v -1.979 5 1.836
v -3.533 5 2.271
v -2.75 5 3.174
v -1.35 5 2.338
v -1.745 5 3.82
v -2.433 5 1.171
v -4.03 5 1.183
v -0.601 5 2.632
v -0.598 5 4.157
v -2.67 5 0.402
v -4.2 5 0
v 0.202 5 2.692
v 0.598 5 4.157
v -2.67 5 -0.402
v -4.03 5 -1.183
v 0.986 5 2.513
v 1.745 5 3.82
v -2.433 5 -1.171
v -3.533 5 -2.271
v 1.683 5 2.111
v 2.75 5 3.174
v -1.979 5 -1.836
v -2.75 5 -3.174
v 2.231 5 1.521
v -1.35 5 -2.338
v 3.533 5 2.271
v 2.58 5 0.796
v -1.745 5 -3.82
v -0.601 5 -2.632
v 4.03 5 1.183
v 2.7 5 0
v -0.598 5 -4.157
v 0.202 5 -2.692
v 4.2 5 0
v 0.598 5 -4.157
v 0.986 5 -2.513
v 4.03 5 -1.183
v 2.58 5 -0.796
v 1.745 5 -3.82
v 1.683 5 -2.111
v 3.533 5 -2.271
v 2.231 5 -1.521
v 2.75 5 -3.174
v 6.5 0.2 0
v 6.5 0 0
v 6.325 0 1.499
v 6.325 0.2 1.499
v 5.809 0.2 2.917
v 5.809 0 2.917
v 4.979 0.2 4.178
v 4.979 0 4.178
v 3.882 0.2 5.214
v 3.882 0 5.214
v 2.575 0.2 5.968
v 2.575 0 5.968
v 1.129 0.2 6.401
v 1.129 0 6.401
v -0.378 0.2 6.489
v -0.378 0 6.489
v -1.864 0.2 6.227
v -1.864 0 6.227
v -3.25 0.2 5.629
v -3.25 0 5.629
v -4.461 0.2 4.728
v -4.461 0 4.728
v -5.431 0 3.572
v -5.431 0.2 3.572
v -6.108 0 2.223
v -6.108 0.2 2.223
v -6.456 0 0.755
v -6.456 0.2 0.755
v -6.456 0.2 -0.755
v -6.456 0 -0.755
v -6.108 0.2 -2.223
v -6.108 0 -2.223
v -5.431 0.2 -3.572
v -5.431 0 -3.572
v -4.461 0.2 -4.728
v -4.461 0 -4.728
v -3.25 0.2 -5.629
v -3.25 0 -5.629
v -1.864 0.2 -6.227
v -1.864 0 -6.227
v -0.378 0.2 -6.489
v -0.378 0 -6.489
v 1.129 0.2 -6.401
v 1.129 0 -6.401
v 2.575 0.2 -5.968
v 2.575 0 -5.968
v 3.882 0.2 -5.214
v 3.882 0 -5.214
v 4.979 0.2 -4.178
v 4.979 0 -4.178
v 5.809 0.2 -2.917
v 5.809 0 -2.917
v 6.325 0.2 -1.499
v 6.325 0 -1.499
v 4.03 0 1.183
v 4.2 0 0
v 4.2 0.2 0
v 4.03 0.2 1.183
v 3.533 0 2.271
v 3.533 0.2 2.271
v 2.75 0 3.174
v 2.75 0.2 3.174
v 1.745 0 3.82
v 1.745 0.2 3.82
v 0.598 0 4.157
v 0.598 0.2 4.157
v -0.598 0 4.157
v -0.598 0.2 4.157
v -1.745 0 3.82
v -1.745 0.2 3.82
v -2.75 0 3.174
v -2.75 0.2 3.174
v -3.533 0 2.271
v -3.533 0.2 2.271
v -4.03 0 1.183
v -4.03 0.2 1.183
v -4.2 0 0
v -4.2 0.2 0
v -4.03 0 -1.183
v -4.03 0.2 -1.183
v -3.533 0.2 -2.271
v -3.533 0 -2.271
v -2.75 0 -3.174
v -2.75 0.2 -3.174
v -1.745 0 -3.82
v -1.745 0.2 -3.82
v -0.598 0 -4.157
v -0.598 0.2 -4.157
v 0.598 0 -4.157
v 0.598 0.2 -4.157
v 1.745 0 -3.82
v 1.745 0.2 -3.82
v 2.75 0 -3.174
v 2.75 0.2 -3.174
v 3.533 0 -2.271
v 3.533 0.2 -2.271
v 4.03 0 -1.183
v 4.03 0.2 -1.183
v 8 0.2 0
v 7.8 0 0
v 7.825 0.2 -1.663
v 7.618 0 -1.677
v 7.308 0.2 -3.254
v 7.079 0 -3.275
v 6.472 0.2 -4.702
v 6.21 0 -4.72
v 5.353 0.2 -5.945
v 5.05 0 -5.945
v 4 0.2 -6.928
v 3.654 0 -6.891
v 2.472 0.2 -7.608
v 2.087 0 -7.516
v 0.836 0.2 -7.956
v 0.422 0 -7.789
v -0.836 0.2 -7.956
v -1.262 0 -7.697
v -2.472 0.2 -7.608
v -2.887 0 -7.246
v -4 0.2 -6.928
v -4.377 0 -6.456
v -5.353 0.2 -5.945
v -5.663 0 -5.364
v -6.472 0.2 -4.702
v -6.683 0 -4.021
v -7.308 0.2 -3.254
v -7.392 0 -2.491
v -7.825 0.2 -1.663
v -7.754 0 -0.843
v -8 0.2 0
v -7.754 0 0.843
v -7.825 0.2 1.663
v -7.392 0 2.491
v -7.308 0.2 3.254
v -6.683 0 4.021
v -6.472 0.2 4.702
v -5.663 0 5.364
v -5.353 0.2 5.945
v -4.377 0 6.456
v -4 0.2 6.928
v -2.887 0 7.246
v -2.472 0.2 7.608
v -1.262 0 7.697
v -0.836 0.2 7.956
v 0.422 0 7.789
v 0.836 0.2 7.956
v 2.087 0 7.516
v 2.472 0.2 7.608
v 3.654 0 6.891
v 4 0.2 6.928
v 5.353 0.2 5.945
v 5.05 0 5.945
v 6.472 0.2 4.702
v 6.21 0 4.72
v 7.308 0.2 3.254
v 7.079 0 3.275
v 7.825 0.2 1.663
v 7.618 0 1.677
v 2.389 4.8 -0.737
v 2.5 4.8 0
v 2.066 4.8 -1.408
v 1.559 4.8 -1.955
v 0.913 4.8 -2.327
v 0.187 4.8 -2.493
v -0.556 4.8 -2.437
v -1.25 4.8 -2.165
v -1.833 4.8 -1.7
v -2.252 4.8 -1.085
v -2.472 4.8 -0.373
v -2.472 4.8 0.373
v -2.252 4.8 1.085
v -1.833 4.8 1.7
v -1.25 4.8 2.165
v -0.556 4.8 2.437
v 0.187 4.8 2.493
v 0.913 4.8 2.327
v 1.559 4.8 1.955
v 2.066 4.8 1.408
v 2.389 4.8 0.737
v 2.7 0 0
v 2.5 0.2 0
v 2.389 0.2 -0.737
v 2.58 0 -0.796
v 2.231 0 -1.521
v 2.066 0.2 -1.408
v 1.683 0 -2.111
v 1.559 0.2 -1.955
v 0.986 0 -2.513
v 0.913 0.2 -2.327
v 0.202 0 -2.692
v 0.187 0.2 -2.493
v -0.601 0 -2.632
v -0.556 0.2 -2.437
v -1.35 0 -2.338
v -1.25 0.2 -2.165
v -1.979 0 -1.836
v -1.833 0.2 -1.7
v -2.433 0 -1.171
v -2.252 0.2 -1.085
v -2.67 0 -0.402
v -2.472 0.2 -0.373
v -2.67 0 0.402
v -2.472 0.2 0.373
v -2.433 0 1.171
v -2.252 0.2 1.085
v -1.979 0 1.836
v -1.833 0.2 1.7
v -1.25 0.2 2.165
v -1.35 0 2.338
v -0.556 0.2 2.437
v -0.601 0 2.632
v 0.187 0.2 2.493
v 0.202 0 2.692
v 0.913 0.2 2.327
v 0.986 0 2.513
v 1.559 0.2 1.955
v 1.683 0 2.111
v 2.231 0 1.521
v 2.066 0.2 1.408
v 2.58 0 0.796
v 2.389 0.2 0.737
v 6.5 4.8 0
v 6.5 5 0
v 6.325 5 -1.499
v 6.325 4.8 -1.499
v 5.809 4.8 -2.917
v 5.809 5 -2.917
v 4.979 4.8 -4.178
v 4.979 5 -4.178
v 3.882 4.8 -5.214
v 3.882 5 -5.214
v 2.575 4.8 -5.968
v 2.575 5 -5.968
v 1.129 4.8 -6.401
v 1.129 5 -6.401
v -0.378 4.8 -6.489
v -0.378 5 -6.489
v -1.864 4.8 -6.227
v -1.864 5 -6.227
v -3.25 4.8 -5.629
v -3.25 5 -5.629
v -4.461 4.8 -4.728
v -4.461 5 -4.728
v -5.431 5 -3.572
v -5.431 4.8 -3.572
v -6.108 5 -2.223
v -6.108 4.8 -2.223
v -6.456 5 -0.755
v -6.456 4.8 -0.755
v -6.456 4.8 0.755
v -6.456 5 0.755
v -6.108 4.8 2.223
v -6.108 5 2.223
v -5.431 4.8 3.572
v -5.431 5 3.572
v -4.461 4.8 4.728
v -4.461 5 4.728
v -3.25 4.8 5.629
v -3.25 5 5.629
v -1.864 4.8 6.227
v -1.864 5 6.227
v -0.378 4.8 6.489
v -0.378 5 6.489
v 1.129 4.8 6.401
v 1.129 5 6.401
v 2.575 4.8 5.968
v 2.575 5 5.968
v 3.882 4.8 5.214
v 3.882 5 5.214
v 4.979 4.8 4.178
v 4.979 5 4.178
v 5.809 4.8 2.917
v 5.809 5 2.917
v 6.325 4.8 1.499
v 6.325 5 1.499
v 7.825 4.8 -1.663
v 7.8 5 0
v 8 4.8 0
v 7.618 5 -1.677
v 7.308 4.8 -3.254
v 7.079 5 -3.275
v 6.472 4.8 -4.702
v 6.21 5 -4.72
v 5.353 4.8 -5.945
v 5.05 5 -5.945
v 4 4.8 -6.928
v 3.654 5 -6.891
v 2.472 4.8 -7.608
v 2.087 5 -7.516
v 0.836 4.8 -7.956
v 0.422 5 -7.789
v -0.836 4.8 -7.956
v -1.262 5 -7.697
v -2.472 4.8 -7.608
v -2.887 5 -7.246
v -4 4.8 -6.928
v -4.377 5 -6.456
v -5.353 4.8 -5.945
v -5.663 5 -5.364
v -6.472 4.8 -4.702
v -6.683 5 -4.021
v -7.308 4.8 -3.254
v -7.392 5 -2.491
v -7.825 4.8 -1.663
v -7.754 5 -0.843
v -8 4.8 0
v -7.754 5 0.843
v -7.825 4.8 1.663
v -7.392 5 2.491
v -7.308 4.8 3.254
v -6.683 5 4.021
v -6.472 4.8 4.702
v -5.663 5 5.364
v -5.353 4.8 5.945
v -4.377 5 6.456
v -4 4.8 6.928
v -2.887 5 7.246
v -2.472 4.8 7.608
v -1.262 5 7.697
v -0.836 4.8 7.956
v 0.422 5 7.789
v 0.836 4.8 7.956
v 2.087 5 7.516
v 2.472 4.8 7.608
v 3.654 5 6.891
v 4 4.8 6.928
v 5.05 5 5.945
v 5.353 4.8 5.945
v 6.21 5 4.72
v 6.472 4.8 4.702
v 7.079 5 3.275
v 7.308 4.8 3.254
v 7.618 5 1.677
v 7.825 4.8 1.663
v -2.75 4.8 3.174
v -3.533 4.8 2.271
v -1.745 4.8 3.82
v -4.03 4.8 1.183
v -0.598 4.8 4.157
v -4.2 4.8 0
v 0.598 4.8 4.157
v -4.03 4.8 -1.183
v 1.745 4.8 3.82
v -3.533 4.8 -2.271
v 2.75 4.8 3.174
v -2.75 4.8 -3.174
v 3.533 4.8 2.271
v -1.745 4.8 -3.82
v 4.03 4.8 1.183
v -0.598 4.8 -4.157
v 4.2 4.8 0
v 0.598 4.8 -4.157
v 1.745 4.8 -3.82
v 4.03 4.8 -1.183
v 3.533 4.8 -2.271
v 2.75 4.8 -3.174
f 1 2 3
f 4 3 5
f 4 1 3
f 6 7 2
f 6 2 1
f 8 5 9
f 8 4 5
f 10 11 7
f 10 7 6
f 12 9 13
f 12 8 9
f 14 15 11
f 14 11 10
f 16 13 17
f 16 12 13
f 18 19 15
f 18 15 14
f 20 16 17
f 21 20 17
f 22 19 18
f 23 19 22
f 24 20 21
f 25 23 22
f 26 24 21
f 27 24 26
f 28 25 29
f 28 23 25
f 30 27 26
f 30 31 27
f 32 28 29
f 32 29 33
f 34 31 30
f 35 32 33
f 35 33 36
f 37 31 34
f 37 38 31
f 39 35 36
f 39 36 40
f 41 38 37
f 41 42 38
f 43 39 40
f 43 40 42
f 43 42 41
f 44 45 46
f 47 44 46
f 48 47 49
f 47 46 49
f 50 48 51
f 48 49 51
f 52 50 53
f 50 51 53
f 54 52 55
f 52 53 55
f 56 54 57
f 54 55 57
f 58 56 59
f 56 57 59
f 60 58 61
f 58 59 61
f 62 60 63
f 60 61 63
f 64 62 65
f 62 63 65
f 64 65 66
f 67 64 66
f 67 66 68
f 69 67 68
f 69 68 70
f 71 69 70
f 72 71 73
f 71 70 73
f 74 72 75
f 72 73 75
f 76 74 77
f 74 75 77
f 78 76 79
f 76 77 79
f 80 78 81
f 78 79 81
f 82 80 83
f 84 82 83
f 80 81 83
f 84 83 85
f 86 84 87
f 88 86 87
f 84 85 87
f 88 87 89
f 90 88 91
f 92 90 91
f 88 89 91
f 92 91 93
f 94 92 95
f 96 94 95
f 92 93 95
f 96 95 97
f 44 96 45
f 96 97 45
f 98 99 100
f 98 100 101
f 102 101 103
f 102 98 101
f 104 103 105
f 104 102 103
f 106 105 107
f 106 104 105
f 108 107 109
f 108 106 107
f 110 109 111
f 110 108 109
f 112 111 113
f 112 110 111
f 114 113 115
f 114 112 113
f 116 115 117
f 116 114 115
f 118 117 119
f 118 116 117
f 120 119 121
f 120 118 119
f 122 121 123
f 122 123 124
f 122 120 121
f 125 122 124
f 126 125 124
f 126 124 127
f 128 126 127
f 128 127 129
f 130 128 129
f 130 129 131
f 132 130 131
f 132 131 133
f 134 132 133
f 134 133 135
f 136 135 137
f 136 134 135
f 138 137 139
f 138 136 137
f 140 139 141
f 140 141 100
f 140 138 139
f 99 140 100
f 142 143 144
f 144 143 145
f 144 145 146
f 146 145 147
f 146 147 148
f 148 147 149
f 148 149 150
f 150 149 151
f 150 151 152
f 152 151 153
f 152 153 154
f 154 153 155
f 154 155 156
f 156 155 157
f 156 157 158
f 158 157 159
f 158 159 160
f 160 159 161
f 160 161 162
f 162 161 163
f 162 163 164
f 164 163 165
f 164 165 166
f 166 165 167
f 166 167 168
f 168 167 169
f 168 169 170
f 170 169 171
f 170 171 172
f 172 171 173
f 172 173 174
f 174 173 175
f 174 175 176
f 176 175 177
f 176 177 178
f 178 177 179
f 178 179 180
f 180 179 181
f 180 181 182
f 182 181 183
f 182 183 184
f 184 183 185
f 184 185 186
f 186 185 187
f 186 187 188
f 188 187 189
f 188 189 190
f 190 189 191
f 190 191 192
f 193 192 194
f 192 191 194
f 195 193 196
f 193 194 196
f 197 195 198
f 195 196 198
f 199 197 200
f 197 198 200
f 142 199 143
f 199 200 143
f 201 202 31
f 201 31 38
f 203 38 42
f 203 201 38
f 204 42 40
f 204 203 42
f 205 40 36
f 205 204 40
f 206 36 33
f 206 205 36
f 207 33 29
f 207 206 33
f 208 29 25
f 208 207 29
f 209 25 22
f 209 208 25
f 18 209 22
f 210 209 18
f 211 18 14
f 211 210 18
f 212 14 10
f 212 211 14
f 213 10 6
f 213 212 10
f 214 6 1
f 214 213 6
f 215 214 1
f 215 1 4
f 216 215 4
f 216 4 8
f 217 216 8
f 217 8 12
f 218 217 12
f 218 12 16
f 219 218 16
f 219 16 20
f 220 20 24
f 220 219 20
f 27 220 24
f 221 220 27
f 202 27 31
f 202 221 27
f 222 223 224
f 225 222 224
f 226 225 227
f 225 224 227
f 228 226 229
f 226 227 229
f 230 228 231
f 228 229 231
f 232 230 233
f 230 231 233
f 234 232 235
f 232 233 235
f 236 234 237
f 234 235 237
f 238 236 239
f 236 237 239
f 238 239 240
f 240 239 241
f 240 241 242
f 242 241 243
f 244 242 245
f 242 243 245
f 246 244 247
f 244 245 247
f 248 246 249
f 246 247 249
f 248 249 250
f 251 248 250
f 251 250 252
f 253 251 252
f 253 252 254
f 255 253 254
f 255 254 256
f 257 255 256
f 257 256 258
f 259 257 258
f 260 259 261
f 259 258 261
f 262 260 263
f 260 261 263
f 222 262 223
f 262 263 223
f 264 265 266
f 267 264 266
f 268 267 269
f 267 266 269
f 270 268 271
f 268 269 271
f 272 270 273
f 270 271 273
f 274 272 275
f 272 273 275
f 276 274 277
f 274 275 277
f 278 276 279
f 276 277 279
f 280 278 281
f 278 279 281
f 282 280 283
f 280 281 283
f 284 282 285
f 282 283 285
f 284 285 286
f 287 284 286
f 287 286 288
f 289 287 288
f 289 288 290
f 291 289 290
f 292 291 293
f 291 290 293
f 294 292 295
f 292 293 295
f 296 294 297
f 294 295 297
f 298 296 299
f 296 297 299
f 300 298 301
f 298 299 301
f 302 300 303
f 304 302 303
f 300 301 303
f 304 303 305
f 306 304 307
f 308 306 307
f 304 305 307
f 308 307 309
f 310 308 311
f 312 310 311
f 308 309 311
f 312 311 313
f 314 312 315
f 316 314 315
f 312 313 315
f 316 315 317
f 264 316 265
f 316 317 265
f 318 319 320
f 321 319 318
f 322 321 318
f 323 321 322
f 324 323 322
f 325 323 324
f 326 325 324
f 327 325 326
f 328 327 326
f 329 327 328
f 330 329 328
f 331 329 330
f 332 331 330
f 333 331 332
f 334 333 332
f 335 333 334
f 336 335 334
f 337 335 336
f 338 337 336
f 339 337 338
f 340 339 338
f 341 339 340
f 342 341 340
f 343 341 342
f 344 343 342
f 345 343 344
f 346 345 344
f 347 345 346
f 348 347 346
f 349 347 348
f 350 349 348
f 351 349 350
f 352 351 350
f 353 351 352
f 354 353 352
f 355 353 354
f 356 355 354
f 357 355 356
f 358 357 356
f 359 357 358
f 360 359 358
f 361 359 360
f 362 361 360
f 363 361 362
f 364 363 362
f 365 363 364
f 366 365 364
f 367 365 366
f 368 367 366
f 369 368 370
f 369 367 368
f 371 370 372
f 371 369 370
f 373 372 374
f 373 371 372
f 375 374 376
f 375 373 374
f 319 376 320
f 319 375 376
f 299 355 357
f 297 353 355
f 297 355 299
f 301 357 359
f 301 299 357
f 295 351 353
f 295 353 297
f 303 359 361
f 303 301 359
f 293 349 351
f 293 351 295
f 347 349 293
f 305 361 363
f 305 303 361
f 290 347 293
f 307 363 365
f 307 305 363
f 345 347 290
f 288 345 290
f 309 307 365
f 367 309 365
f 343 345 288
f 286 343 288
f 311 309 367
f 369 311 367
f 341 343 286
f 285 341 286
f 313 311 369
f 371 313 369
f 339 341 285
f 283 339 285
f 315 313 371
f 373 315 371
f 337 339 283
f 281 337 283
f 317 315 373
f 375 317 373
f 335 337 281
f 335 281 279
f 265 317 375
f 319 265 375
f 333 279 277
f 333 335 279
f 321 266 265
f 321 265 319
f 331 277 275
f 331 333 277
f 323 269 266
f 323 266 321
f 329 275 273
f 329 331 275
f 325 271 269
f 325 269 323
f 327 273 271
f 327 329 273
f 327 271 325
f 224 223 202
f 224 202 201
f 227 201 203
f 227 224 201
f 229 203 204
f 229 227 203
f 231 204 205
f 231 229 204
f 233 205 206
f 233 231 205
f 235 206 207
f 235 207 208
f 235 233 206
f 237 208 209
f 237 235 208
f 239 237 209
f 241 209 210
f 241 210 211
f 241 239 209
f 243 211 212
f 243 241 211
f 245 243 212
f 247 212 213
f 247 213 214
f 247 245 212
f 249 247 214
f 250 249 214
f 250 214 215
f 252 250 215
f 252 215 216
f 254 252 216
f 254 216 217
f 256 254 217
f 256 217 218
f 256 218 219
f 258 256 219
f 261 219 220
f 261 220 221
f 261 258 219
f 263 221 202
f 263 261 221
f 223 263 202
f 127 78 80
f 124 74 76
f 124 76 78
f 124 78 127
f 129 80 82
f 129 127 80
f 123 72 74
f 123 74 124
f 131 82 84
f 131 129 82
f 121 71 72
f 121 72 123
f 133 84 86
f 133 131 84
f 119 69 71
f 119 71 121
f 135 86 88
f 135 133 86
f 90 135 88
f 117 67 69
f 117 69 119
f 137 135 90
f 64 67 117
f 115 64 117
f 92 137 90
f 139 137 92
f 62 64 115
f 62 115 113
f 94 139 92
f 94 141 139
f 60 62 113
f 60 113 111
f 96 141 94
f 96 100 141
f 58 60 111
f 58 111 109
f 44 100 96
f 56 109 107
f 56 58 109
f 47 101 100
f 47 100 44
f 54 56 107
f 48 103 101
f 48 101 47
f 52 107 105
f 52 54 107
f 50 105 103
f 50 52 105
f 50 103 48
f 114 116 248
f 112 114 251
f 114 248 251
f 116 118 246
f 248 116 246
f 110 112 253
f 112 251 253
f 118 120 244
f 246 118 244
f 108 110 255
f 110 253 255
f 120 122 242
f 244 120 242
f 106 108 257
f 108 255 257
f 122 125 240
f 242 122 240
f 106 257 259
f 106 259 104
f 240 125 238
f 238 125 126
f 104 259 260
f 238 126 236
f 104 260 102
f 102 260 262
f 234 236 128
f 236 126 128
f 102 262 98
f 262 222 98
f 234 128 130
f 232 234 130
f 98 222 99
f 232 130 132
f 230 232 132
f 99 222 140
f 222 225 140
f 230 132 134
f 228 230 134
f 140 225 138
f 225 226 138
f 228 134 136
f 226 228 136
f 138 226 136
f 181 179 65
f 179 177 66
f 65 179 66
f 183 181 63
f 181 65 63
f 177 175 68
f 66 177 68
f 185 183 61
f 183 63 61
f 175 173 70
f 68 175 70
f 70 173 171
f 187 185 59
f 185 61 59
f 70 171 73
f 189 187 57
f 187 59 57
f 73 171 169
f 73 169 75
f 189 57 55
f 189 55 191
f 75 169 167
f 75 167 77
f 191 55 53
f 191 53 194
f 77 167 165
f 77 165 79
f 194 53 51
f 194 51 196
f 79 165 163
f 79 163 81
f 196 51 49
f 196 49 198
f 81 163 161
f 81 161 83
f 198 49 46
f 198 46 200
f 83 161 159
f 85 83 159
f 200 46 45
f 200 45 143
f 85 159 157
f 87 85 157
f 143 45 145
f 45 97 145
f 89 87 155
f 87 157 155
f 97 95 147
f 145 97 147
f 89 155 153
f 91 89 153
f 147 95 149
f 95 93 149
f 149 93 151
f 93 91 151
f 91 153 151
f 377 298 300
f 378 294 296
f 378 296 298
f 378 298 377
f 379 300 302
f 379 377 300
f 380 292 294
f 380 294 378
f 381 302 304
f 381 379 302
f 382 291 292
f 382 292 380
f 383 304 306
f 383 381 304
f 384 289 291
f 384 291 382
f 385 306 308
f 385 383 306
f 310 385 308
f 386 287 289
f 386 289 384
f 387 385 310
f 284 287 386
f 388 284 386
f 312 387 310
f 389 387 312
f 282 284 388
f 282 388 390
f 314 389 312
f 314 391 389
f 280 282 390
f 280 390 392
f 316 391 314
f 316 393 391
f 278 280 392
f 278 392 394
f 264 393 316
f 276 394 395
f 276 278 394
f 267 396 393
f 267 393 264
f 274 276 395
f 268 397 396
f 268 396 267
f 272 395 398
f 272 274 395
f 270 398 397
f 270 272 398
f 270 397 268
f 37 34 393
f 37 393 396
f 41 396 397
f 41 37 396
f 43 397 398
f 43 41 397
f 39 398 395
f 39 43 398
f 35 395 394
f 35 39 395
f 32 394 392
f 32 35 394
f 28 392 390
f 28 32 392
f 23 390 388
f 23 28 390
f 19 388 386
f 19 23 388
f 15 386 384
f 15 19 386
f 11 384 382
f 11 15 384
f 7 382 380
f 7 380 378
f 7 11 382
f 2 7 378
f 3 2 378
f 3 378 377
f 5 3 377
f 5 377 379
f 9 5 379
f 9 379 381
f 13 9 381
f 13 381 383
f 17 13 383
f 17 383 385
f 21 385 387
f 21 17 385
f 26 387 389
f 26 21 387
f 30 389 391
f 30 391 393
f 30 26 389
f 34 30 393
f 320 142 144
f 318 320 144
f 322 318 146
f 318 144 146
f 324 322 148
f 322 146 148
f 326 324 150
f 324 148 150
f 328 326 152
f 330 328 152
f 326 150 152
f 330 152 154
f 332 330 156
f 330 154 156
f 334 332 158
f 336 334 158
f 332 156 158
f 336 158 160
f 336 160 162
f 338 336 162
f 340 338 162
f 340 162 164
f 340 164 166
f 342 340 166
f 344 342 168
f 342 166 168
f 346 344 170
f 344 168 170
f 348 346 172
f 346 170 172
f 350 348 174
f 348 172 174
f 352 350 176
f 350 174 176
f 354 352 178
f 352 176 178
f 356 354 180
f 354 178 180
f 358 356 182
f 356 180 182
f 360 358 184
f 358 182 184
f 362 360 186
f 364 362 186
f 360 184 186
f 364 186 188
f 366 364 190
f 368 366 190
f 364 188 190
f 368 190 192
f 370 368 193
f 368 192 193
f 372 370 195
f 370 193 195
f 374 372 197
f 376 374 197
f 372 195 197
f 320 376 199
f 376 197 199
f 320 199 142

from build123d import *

# Parameters (mm, degrees)
SKETCH1_R           = 8
SKETCH1_R_2         = 2.5
BOSS_EXTRUDE1_DEPTH = 5
SKETCH2_R           = 6.5
SKETCH2_R_2         = 4.2
CUT_EXTRUDE1_DEPTH  = 0.2
SKETCH3_R           = 6.5
SKETCH3_R_2         = 4.2
CUT_EXTRUDE2_DEPTH  = 0.2
CHAMFER1_SIZE       = 0.2


with BuildPart() as part:
    # Sketch1 → Boss-Extrude1 (new body)
    with BuildSketch(Plane(origin=(0, 0, 0), x_dir=(1, 0, 0), z_dir=(0, 1, 0))):
        Circle(SKETCH1_R)
        Circle(SKETCH1_R_2, mode=Mode.SUBTRACT)
    extrude(amount=BOSS_EXTRUDE1_DEPTH)

    # Sketch2 → Cut-Extrude1 (cut)
    with BuildSketch(Plane(origin=(0, 5, 0), x_dir=(1, 0, 0), z_dir=(0, 1, 0))):
        Circle(SKETCH2_R)
        Circle(SKETCH2_R_2, mode=Mode.SUBTRACT)
    extrude(amount=-CUT_EXTRUDE1_DEPTH, mode=Mode.SUBTRACT)

    # Sketch3 → Cut-Extrude2 (cut)
    with BuildSketch(Plane.XZ):
        Circle(SKETCH3_R)
        Circle(SKETCH3_R_2, mode=Mode.SUBTRACT)
    extrude(amount=-CUT_EXTRUDE2_DEPTH, mode=Mode.SUBTRACT)

    # Chamfer1
    chamfer1_edges = [part.edges().sort_by_distance(p)[0] for p in [
        (-8, 0, 0),
        (-8, 5, 0),
        (-2.5, 0, 0),
        (-2.5, 5, 0),
    ]]
    chamfer(chamfer1_edges, length=CHAMFER1_SIZE)


solid = part.part
